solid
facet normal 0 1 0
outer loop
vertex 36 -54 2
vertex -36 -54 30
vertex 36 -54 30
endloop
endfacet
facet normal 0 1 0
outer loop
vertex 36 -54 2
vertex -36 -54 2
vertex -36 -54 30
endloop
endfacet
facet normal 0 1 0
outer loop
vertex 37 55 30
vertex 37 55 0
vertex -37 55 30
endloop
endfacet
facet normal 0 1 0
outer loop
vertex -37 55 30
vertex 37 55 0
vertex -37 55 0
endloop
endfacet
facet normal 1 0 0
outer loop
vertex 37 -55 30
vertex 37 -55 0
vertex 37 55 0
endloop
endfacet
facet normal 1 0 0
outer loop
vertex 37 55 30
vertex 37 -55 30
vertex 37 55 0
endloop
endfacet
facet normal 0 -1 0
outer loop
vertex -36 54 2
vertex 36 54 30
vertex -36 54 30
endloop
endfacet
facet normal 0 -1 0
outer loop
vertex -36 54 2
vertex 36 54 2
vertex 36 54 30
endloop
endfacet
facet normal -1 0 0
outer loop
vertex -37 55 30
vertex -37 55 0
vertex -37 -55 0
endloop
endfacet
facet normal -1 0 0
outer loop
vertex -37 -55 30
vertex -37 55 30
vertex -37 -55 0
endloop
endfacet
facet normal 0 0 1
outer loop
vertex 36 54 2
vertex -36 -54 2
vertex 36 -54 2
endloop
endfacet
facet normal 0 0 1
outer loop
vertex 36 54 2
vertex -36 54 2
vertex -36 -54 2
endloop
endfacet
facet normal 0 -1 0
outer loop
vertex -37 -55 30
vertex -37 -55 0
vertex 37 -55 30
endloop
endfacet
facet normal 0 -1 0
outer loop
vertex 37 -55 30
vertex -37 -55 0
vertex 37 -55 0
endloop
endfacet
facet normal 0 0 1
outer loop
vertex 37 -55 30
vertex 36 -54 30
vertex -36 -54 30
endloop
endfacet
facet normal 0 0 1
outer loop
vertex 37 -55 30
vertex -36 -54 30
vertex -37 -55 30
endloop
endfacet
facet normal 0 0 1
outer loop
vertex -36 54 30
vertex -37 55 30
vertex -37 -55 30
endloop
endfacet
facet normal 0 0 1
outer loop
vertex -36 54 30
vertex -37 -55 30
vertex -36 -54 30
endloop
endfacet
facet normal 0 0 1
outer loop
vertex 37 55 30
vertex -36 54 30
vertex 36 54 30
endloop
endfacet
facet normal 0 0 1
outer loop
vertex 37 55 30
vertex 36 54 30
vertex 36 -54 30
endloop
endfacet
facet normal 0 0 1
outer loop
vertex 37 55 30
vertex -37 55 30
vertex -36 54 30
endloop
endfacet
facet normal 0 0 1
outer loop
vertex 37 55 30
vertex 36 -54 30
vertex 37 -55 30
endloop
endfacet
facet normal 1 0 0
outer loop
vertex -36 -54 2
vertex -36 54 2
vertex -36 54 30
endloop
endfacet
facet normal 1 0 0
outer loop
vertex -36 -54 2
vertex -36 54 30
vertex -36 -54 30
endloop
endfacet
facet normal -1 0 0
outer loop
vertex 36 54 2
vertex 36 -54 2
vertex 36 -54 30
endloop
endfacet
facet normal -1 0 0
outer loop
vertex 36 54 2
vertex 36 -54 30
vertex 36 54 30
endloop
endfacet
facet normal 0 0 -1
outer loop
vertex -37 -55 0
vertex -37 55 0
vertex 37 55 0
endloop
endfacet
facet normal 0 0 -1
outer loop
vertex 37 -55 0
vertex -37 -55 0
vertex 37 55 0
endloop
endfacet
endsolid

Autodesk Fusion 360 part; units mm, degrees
sketch "Sketch1" plane through (0, 0, 0) normal (0, 0, 1) x (1, 0, 0)
  line L0 (36, 54) -> (-36, 54)
  line L1 (-36, 54) -> (-36, -54)
  line L2 (-36, -54) -> (36, -54)
  line L3 (36, -54) -> (36, 54)
  line L4 (36, 54) -> (-36, -54) construction
  line L5 (-36, 54) -> (36, -54) construction
  line L6 (37, 55) -> (-37, 55)
  line L7 (-37, 55) -> (-37, -55)
  line L8 (-37, -55) -> (37, -55)
  line L9 (37, -55) -> (37, 55)
  line L10 (37, 55) -> (-37, -55) construction
  line L11 (-37, 55) -> (37, -55) construction
  dimension "d1" = 72
  dimension "d2" = 108
  dimension "d3" = 74
  dimension "d4" = 110
extrude "Extrude1" add sketch "Sketch1" along normal blind 30
extrude "Extrude2" add sketch "Sketch1" along normal blind 2 contours L0 L1 L2 L3
